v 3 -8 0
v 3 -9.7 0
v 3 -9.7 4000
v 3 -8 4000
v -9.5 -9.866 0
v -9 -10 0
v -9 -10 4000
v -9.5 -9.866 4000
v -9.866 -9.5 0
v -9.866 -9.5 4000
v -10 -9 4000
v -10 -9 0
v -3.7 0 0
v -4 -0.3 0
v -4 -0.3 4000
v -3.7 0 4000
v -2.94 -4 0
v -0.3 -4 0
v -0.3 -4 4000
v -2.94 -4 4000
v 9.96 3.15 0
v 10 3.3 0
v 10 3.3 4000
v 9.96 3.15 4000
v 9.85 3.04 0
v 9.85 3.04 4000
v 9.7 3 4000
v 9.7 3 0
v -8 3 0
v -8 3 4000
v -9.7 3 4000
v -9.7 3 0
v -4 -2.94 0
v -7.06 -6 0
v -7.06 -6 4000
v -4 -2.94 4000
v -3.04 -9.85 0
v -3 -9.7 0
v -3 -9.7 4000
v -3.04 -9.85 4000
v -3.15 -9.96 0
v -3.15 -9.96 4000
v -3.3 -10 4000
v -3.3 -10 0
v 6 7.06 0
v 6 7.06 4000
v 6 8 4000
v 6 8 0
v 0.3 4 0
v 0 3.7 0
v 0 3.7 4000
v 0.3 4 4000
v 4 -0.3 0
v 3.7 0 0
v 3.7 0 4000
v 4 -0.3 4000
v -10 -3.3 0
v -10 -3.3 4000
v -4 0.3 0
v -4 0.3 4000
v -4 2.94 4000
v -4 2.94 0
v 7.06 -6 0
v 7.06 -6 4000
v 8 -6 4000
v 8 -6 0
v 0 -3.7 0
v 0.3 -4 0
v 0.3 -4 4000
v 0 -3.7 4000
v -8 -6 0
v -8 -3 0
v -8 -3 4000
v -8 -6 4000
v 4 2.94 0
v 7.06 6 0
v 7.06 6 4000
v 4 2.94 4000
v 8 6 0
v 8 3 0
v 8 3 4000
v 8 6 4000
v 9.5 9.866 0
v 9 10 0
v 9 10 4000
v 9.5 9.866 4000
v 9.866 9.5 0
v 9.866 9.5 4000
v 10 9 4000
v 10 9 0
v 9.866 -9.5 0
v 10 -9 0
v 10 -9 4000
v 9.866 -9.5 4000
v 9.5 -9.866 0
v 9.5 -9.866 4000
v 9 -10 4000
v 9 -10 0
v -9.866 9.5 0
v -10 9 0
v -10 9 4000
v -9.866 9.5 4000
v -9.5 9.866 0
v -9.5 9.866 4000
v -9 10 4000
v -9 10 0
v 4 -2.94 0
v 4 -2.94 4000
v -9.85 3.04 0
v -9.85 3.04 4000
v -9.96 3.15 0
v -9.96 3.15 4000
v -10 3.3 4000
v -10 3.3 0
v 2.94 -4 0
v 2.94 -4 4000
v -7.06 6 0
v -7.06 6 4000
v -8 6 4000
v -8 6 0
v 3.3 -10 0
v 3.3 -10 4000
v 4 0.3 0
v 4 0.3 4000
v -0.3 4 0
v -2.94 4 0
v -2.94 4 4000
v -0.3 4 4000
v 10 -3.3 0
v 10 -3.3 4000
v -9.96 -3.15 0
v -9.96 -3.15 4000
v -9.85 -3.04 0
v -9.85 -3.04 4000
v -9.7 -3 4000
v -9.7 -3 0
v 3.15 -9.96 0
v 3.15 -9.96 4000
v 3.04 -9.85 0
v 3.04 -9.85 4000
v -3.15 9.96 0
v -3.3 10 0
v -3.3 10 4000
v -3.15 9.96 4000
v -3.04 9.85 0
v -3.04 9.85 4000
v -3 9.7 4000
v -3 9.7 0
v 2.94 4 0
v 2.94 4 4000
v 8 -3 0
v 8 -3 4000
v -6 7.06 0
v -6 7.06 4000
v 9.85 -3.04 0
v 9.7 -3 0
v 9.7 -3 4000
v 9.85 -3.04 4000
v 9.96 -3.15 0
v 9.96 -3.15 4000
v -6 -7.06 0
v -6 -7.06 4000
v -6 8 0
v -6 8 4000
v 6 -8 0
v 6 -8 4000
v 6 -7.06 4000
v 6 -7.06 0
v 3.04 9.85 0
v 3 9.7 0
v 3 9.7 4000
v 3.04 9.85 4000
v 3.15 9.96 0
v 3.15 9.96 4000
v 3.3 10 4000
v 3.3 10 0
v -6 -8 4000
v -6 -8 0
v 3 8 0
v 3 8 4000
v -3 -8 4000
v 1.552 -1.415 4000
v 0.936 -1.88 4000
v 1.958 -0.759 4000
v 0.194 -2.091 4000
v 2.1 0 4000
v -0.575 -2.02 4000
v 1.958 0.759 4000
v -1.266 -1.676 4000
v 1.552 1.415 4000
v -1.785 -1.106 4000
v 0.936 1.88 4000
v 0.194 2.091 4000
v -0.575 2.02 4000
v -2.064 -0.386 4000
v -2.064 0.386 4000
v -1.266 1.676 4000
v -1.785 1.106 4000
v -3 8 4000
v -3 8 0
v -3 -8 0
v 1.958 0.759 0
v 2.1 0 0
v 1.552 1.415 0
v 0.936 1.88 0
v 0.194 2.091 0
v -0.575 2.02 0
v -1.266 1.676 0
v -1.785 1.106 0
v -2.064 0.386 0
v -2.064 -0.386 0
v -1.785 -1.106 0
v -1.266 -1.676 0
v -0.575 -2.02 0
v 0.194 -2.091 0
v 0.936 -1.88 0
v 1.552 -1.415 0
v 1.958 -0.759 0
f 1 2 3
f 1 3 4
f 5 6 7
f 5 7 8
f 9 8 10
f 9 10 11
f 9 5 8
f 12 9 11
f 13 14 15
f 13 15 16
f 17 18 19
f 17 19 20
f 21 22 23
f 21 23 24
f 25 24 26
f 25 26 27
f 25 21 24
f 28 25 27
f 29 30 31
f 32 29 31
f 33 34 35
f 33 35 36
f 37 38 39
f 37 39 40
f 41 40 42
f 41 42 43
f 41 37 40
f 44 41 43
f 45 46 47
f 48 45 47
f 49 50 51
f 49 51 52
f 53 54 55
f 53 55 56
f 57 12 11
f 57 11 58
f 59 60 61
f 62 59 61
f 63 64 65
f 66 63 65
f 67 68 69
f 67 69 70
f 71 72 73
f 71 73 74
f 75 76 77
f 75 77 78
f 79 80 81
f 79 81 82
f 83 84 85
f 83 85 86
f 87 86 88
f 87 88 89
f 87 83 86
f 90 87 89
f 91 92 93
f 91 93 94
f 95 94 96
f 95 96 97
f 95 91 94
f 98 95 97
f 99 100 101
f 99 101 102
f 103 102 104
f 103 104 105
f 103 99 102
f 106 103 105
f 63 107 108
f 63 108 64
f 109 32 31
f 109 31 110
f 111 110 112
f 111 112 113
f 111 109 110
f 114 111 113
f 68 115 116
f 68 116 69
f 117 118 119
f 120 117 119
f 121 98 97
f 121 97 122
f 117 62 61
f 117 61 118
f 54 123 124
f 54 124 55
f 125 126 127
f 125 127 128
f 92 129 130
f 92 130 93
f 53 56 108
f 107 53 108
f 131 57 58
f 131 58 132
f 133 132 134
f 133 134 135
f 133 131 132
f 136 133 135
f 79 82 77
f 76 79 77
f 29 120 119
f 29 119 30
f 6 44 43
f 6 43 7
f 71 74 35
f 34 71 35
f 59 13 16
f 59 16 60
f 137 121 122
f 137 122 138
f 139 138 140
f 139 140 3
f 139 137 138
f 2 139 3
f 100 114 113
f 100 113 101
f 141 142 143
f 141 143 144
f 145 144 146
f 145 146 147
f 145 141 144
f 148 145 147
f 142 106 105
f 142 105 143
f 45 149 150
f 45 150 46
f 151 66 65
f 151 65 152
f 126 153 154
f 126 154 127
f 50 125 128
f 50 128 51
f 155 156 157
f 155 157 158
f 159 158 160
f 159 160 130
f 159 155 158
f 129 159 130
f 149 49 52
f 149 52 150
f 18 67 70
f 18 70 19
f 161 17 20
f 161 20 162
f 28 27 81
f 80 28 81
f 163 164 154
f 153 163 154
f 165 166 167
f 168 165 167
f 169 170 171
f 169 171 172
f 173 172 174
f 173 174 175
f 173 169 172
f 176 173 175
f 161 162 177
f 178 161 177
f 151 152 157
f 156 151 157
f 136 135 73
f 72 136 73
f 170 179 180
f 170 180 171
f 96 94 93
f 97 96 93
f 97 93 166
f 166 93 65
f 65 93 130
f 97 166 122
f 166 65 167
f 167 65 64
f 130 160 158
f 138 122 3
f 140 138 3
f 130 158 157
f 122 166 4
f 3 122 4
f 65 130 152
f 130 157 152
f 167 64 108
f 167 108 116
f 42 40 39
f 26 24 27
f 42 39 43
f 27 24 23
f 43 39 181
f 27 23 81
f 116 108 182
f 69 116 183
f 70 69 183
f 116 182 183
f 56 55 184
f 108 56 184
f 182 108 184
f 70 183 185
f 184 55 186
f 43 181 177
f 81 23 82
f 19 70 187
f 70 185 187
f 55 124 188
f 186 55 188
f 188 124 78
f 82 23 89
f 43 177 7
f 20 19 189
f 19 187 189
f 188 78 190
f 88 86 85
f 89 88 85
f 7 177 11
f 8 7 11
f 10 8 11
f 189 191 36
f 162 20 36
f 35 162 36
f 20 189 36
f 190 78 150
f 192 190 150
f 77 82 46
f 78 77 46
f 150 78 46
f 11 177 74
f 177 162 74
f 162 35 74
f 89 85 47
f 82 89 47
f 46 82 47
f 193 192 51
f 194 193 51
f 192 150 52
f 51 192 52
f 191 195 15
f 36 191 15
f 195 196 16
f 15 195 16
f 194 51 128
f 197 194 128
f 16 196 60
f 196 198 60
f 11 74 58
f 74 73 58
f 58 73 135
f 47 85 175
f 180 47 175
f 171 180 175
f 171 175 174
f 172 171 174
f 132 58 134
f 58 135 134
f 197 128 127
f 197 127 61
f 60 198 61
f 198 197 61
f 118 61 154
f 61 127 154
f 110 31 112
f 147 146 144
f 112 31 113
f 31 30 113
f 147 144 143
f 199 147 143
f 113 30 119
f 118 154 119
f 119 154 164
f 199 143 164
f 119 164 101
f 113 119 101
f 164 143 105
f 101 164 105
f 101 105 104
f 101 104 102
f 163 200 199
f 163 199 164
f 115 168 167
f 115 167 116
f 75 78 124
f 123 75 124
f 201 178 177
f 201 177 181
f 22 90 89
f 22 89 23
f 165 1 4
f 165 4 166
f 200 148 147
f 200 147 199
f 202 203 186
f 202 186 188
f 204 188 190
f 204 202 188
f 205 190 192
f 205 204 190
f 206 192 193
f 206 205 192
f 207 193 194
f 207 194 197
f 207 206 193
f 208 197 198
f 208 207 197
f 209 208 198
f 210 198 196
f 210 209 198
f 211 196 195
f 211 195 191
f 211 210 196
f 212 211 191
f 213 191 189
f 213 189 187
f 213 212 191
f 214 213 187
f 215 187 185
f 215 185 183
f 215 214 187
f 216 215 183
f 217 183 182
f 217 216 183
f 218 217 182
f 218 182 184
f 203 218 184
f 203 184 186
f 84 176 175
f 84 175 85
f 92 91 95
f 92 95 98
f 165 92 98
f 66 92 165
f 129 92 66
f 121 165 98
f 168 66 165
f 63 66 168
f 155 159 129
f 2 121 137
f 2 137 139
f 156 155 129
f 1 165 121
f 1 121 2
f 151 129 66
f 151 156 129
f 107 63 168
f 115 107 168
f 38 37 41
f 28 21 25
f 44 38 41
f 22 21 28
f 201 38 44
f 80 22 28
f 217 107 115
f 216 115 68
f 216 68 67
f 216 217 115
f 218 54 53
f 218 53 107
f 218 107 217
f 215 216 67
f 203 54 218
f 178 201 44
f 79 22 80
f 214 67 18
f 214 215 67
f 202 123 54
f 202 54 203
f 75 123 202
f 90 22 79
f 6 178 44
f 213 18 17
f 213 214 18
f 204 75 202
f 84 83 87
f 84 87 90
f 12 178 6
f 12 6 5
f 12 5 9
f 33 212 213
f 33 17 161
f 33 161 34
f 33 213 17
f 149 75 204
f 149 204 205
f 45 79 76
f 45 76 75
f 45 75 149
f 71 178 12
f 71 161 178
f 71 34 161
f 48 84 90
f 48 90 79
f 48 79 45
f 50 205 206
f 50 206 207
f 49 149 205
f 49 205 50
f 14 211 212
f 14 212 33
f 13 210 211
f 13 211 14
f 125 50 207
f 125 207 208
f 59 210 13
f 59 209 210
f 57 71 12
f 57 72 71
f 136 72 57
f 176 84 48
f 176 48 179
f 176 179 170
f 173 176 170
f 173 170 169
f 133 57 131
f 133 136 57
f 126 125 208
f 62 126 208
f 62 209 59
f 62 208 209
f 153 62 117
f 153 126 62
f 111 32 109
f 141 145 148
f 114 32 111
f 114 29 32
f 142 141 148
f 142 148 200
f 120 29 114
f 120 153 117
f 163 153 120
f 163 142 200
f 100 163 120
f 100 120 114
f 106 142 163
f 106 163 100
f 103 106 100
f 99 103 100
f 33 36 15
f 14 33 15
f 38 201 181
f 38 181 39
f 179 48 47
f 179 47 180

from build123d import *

# Parameters (mm, degrees)
SKETCH_2_R      = 2.0999999
EXTRUDE_1_DEPTH = 4000


with BuildPart() as part:
    # ｽｹｯﾁ2 → 押し出し1 (new body)
    with BuildSketch(Plane.XY):
        with BuildLine():
            Line((10, 9), (10, 3.3))
            ThreePointArc((10, 3.3), (9.912132034, 3.087867966), (9.7, 3))
            Line((9.7, 3), (8, 3))
            Line((8, 3), (8, 6))
            Line((8, 6), (7.06, 6))
            Line((7.06, 6), (4, 2.94))
            Line((4, 2.94), (4, 0.3))
            Line((4, 0.3), (3.7, 0))
            Line((3.7, 0), (4, -0.3))
            Line((4, -0.3), (4, -2.94))
            Line((4, -2.94), (7.06, -6))
            Line((7.06, -6), (8, -6))
            Line((8, -6), (8, -3))
            Line((8, -3), (9.7, -3))
            ThreePointArc((9.7, -3), (9.912132034, -3.087867966), (10, -3.3))
            Line((10, -3.3), (10, -9))
            ThreePointArc((10, -9), (9.707106781, -9.707106781), (9, -10))
            Line((9, -10), (3.3, -10))
            ThreePointArc((3.3, -10), (3.087867966, -9.912132034), (3, -9.7))
            Line((3, -9.7), (3, -8.000001421))
            Line((3, -8.000001421), (6, -8.000001421))
            Line((6, -8.000001421), (6, -7.060001421))
            Line((6, -7.060001421), (2.939906298, -3.999907719))
            Line((2.939906298, -3.999907719), (0.3, -3.999907719))
            Line((0.3, -3.999907719), (0, -3.699907719))
            Line((0, -3.699907719), (-0.3, -3.999907719))
            Line((-0.3, -3.999907719), (-2.939906298, -3.999907719))
            Line((-2.939906298, -3.999907719), (-6, -7.060001421))
            Line((-6, -7.060001421), (-6, -8.000001421))
            Line((-6, -8.000001421), (-3, -8.000001421))
            Line((-3, -8.000001421), (-3, -9.7))
            ThreePointArc((-3, -9.7), (-3.087867966, -9.912132034), (-3.3, -10))
            Line((-3.3, -10), (-9, -10))
            ThreePointArc((-9, -10), (-9.707106781, -9.707106781), (-10, -9))
            Line((-10, -9), (-10, -3.3))
            ThreePointArc((-10, -3.3), (-9.912132034, -3.087867966), (-9.7, -3))
            Line((-9.7, -3), (-8, -3))
            Line((-8, -3), (-8, -6))
            Line((-8, -6), (-7.06, -6))
            Line((-7.06, -6), (-4, -2.94))
            Line((-4, -2.94), (-4, -0.3))
            Line((-4, -0.3), (-3.7, 0))
            Line((-3.7, 0), (-4, 0.3))
            Line((-4, 0.3), (-4, 2.94))
            Line((-4, 2.94), (-7.06, 6))
            Line((-7.06, 6), (-8, 6))
            Line((-8, 6), (-8, 3))
            Line((-8, 3), (-9.7, 3))
            ThreePointArc((-9.7, 3), (-9.912132034, 3.087867966), (-10, 3.3))
            Line((-10, 3.3), (-10, 9))
            ThreePointArc((-10, 9), (-9.707106781, 9.707106781), (-9, 10))
            Line((-9, 10), (-3.3, 10))
            ThreePointArc((-3.3, 10), (-3.087867966, 9.912132034), (-3, 9.7))
            Line((-3, 9.7), (-3, 8.000001421))
            Line((-3, 8.000001421), (-6, 8.000001421))
            Line((-6, 8.000001421), (-6, 7.060001421))
            Line((-6, 7.060001421), (-2.939906298, 3.999907719))
            Line((-2.939906298, 3.999907719), (-0.3, 3.999907719))
            Line((-0.3, 3.999907719), (0, 3.699907719))
            Line((0, 3.699907719), (0.3, 3.999907719))
            Line((0.3, 3.999907719), (2.939906298, 3.999907719))
            Line((2.939906298, 3.999907719), (6, 7.060001421))
            Line((6, 7.060001421), (6, 8.000001421))
            Line((6, 8.000001421), (3, 8.000001421))
            Line((3, 8.000001421), (3, 9.7))
            ThreePointArc((3, 9.7), (3.087867966, 9.912132034), (3.3, 10))
            Line((3.3, 10), (9, 10))
            ThreePointArc((9, 10), (9.707106781, 9.707106781), (10, 9))
        make_face()
        Circle(SKETCH_2_R, mode=Mode.SUBTRACT)
    extrude(amount=EXTRUDE_1_DEPTH)


solid = part.part
